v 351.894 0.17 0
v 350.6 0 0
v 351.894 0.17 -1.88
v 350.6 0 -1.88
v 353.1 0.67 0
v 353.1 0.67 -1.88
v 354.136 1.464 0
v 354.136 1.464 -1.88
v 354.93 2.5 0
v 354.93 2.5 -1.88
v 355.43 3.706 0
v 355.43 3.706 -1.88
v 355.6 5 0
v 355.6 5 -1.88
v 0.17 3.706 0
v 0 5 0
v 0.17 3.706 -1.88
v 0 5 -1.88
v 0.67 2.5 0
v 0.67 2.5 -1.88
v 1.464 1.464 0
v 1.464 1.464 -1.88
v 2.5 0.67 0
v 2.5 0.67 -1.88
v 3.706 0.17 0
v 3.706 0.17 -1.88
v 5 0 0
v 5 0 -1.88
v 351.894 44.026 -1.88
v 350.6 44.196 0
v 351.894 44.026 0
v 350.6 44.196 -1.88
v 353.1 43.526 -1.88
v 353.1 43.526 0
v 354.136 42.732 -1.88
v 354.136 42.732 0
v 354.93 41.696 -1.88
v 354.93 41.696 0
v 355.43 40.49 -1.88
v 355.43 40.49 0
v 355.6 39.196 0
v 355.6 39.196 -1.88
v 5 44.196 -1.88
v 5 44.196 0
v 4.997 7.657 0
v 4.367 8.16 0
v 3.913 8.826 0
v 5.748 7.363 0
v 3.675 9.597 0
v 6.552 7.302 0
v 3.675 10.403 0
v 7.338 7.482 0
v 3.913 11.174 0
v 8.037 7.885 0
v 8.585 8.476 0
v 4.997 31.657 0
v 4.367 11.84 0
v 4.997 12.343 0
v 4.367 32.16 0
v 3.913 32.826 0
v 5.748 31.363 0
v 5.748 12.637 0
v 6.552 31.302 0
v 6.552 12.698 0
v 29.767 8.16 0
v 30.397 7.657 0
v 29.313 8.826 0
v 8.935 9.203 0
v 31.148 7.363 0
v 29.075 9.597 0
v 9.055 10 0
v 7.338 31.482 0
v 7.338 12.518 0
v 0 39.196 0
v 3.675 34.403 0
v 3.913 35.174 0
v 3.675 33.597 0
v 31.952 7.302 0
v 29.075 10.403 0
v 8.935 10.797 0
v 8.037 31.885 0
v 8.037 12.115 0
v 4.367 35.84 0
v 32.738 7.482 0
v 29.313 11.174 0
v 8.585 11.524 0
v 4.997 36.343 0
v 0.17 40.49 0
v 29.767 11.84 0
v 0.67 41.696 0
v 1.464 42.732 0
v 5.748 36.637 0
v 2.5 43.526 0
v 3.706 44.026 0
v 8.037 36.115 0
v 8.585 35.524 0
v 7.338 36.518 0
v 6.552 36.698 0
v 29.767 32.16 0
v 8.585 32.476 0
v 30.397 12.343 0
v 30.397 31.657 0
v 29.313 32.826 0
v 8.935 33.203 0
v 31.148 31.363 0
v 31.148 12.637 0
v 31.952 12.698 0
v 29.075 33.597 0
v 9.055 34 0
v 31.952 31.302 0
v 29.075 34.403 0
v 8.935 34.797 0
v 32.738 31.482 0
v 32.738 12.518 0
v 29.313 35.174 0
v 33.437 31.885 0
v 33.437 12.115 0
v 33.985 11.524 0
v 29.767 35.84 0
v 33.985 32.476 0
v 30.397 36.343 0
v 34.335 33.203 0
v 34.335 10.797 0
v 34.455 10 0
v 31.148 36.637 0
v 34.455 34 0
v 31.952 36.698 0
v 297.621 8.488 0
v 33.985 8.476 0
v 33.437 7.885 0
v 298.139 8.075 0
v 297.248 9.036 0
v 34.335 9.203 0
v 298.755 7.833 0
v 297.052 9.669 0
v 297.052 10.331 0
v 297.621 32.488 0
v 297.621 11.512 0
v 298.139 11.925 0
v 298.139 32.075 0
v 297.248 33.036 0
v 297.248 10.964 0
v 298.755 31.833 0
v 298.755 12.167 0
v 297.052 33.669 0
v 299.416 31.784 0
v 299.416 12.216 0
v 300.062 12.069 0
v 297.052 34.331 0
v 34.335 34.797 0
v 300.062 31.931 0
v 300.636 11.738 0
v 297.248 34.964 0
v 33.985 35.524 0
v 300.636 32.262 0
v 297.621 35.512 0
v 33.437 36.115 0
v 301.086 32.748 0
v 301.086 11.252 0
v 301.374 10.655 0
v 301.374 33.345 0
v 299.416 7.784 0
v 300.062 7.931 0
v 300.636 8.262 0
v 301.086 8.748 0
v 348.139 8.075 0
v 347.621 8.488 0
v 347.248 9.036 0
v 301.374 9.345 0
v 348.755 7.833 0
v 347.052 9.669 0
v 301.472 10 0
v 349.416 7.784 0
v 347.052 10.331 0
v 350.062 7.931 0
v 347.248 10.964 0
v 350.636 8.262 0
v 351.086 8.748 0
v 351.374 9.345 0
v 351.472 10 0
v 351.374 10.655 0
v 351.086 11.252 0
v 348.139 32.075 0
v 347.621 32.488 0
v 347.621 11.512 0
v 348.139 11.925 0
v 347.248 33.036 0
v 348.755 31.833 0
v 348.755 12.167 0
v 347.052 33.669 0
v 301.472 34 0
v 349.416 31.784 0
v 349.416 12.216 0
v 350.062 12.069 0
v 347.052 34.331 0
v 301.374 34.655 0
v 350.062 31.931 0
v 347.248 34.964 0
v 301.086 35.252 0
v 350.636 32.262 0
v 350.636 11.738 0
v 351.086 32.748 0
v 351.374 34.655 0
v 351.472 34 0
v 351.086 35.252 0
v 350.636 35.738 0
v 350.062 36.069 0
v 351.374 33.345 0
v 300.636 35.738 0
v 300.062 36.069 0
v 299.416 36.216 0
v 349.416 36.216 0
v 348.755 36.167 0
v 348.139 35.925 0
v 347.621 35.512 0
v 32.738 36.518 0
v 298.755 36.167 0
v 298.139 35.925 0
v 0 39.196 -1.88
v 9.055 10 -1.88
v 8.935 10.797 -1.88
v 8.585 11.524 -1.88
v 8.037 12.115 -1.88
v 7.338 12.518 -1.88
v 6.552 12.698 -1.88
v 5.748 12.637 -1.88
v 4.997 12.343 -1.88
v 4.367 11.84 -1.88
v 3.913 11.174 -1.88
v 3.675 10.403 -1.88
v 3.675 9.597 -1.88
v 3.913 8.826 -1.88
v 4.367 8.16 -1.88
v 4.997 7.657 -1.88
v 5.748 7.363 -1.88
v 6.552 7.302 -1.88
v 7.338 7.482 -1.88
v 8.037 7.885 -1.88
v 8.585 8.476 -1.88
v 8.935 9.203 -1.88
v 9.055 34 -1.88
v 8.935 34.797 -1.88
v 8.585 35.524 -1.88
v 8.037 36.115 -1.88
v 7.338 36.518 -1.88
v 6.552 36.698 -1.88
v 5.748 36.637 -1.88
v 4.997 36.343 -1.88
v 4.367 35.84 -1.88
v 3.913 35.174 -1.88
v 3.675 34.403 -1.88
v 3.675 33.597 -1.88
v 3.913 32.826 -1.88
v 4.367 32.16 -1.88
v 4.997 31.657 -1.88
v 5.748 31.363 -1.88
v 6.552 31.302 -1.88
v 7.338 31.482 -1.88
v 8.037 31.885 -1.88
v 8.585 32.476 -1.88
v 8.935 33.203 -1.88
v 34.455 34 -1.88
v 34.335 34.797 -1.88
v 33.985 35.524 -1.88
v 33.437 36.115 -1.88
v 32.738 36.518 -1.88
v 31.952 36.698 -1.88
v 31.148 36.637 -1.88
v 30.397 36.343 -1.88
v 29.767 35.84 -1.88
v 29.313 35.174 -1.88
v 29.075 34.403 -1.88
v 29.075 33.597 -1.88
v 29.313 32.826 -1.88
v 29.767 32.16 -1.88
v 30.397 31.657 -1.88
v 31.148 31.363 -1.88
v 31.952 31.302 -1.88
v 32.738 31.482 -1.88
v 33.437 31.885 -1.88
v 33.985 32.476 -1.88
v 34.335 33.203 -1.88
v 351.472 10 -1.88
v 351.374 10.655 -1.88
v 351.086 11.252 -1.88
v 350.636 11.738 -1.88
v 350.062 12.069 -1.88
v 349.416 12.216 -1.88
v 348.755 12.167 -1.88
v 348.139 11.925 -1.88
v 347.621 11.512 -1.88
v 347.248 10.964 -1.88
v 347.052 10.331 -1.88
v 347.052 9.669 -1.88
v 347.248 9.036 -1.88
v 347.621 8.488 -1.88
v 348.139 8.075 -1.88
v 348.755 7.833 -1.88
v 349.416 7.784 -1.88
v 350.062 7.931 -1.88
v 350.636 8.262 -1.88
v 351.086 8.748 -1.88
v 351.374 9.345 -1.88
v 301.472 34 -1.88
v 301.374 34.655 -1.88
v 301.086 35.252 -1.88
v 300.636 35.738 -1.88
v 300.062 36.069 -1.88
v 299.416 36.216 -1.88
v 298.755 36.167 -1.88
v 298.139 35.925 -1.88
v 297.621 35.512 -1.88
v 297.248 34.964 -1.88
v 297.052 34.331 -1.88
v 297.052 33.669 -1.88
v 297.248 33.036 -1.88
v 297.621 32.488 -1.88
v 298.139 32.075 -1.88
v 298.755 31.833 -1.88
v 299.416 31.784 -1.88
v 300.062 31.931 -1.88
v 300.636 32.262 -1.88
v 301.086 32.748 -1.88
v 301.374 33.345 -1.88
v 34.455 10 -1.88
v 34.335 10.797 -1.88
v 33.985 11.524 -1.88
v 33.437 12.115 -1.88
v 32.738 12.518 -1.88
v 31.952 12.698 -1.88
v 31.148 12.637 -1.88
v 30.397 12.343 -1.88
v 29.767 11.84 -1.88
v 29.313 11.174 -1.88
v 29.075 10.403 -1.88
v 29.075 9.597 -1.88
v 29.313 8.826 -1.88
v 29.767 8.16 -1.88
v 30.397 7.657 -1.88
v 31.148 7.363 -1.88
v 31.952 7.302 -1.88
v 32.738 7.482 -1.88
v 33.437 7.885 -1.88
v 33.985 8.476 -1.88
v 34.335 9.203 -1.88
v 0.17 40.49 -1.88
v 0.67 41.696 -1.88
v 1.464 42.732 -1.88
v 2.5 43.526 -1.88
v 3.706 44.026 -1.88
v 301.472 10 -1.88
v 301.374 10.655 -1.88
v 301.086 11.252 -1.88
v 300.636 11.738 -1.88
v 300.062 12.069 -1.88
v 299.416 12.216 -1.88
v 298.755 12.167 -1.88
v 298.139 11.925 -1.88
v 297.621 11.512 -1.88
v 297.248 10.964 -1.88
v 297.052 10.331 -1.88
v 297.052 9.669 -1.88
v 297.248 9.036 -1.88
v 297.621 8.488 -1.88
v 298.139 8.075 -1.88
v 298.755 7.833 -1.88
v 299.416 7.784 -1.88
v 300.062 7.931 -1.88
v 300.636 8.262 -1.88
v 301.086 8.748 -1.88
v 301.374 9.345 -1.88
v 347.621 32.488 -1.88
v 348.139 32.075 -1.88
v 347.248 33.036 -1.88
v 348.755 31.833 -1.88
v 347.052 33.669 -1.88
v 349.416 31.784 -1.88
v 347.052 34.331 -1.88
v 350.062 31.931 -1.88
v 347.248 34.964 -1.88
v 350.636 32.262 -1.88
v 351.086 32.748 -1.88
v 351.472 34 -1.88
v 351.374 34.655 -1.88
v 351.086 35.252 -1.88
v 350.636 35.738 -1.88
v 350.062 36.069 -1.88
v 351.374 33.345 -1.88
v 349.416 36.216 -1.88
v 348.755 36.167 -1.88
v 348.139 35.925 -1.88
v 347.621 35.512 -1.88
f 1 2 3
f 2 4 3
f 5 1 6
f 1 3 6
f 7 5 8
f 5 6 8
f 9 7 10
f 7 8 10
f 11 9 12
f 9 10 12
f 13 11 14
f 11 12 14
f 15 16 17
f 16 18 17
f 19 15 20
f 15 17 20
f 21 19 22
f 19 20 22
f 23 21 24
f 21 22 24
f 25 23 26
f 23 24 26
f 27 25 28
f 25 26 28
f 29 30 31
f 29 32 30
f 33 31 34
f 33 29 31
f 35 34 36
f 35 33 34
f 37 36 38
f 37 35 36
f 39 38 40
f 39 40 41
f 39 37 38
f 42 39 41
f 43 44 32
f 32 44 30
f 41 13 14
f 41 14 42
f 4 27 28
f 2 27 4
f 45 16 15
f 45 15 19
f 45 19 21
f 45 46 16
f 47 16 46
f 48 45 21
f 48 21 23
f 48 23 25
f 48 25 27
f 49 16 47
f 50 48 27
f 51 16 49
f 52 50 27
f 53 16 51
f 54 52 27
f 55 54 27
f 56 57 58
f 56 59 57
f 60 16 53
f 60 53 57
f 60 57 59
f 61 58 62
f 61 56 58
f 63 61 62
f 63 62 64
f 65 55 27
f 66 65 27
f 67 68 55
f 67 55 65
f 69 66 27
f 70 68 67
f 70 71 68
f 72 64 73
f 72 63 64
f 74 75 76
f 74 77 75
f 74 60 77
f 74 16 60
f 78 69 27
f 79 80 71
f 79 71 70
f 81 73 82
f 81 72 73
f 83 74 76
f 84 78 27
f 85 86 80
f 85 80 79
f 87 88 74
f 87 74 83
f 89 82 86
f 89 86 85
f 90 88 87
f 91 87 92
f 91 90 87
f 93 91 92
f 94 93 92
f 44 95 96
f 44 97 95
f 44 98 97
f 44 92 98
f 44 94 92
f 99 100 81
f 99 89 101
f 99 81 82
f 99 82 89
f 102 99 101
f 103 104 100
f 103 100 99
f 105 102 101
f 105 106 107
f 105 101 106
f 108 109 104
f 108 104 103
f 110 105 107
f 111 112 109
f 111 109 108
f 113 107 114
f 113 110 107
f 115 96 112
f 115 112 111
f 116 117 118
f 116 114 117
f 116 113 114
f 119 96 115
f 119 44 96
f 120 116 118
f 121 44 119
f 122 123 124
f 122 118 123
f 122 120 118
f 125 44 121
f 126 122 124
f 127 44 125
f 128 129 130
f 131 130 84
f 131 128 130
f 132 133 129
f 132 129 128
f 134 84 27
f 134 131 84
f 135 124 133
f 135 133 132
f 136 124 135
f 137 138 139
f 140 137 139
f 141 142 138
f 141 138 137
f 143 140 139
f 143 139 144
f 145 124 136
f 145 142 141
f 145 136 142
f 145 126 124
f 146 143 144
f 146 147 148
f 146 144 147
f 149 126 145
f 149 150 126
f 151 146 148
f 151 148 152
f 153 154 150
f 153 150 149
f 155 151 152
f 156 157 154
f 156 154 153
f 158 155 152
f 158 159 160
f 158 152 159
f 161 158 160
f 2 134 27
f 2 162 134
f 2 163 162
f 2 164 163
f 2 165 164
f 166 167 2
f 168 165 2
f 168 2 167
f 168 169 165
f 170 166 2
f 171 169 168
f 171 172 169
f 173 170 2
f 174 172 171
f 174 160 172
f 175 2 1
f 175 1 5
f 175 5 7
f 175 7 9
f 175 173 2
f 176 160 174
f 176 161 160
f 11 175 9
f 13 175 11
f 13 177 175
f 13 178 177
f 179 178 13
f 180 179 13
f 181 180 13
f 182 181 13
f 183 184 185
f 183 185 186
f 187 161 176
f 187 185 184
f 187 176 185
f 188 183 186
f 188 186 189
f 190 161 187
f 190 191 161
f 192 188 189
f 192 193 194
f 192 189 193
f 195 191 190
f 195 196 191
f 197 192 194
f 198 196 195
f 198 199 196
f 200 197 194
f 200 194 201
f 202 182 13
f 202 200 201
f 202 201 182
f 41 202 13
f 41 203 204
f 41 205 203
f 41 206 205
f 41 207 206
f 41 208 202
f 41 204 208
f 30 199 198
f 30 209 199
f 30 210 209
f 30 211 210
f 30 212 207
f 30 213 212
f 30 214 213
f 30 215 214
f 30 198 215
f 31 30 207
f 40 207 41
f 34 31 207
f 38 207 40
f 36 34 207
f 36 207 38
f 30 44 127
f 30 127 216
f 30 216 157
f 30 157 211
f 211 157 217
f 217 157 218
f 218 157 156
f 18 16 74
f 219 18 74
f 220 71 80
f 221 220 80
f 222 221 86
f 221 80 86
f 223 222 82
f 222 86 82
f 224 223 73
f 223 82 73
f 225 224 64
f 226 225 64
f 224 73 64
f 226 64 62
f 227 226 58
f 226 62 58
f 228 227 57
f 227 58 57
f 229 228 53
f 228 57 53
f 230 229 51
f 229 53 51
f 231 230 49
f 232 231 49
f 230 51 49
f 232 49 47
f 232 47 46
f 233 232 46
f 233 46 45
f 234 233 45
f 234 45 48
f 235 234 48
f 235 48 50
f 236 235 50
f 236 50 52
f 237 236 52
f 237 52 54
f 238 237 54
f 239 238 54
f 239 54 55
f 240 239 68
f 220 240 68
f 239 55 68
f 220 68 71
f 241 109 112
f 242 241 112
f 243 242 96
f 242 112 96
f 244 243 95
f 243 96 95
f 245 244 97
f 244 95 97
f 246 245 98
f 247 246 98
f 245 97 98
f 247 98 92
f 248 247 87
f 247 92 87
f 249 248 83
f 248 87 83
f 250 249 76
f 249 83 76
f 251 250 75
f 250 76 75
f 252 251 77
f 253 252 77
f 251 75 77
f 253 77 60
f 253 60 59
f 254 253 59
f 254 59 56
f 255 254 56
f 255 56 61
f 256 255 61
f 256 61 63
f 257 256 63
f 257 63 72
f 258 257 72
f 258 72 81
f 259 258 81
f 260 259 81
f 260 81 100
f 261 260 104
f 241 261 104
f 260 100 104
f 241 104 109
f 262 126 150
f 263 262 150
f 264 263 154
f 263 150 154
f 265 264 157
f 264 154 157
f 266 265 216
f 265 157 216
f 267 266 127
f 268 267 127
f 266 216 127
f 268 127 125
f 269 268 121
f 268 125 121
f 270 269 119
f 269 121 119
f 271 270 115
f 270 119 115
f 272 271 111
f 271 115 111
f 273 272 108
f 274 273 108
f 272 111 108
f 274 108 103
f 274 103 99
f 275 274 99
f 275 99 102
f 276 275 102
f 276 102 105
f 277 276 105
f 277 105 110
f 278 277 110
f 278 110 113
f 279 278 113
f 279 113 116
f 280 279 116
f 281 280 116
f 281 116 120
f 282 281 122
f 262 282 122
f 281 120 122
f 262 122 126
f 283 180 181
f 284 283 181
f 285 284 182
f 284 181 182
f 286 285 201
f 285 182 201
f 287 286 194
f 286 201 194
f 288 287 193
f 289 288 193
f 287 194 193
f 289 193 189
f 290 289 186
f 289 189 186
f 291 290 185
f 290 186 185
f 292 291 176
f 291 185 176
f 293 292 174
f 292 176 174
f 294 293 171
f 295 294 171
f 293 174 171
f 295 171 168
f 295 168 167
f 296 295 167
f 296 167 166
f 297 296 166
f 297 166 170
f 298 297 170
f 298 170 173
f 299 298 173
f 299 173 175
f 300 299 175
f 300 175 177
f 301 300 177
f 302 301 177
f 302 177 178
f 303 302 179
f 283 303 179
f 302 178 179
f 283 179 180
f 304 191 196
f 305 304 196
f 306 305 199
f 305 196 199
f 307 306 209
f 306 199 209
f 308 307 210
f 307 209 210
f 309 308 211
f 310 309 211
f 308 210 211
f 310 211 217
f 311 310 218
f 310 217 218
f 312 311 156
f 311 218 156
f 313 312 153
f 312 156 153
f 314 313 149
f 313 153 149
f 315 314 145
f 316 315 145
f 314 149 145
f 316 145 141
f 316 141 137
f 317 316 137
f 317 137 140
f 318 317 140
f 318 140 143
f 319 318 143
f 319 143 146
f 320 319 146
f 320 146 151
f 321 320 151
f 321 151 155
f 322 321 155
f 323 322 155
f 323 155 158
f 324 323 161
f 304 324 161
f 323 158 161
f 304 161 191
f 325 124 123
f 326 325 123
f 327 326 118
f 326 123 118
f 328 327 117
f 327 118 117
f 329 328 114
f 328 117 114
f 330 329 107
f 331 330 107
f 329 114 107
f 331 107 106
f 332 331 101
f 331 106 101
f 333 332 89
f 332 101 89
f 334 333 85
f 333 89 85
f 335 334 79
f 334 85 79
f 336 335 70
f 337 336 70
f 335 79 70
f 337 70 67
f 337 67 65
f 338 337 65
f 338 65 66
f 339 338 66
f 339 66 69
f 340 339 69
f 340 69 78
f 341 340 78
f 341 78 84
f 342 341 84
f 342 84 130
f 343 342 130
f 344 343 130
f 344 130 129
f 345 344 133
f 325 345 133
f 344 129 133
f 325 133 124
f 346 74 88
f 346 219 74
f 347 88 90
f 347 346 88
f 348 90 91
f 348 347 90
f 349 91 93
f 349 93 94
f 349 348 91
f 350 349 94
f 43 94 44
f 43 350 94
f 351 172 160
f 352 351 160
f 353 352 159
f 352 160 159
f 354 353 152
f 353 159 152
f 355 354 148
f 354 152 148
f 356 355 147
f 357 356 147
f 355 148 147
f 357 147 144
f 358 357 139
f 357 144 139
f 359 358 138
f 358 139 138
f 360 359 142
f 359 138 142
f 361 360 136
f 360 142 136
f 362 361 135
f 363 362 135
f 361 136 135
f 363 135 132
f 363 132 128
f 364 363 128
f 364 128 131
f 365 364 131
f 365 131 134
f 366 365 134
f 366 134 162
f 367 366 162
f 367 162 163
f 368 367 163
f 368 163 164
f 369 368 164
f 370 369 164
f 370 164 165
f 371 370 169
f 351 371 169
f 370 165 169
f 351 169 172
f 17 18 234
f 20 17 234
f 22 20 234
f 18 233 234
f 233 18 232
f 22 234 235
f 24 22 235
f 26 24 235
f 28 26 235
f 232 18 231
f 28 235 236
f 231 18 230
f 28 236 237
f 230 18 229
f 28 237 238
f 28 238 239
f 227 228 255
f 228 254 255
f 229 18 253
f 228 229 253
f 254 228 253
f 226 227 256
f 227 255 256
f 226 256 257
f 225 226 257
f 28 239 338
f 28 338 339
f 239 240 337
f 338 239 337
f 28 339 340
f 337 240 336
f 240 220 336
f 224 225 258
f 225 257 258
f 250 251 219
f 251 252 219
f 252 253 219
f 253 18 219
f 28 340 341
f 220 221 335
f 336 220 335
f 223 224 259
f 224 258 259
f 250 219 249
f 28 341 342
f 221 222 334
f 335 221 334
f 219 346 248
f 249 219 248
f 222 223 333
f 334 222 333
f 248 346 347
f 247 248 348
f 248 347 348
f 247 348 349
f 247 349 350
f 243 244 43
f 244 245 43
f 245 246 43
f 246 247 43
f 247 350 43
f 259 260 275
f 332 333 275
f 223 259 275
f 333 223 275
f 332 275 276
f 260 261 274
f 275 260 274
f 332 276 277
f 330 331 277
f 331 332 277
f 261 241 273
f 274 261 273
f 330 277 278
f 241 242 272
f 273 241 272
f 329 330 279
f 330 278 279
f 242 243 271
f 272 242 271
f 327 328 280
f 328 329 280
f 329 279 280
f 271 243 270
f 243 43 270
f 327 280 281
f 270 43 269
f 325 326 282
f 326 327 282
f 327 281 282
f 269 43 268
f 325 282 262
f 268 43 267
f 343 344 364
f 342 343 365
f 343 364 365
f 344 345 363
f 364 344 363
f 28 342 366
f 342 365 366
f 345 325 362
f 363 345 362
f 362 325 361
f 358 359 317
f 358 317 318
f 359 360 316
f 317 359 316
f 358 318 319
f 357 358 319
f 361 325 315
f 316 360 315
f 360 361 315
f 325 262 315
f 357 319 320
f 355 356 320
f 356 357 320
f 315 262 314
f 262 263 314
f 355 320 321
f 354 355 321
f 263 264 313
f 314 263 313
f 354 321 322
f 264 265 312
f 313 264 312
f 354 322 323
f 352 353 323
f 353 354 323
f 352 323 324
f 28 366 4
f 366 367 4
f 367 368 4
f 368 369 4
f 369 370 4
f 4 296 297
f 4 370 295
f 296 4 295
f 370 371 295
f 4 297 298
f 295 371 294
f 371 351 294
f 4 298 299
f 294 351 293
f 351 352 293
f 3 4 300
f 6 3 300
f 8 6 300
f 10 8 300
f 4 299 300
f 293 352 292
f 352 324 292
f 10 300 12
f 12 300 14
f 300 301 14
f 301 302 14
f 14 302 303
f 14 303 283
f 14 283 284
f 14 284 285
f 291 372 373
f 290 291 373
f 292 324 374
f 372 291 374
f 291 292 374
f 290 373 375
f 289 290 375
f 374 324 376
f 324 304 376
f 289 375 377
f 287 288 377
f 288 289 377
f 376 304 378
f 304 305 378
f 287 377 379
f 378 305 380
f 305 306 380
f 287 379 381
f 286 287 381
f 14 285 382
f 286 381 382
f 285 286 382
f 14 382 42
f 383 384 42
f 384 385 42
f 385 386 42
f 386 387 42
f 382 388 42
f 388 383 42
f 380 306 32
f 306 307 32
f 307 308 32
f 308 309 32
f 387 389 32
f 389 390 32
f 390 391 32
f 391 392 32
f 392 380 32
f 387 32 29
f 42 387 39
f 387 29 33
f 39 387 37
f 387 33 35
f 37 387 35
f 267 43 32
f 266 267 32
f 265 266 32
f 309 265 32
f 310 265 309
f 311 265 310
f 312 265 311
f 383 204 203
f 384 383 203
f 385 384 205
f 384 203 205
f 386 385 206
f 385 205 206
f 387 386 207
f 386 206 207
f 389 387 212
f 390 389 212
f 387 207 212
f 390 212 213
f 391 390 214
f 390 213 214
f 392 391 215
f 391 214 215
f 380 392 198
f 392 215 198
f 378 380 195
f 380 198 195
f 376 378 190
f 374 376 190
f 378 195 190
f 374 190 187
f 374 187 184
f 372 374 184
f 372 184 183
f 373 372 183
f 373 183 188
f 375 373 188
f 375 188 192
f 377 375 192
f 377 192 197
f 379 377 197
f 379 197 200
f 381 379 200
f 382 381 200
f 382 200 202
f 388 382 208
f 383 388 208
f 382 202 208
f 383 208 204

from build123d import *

# Parameters (mm, degrees)
SKETCH1_W          = 355.6
SKETCH1_H          = 44.196
SKETCH1_R          = 2.2225
SKETCH1_R_2        = 2.7051
BASE_FLANGE1_DEPTH = 1.8796
FILLET1_R          = 5


# Sheet-metal steps are written as plain solids
with BuildPart() as part:
    # Sketch1 → Base-Flange1 (new body)
    with BuildSketch(Plane.XY):
        with Locations((177.8, 22.098)):
            Rectangle(SKETCH1_W, SKETCH1_H)
        with Locations((299.25, 10)):
            Circle(SKETCH1_R, mode=Mode.SUBTRACT)
        with Locations((349.25, 10)):
            Circle(SKETCH1_R, mode=Mode.SUBTRACT)
        with Locations((349.25, 34)):
            Circle(SKETCH1_R, mode=Mode.SUBTRACT)
        with Locations((299.25, 34)):
            Circle(SKETCH1_R, mode=Mode.SUBTRACT)
        with Locations((6.35, 34)):
            Circle(SKETCH1_R_2, mode=Mode.SUBTRACT)
        with Locations((31.75, 34)):
            Circle(SKETCH1_R_2, mode=Mode.SUBTRACT)
        with Locations((6.35, 10)):
            Circle(SKETCH1_R_2, mode=Mode.SUBTRACT)
        with Locations((31.75, 10)):
            Circle(SKETCH1_R_2, mode=Mode.SUBTRACT)
    extrude(amount=-BASE_FLANGE1_DEPTH)

    # Fillet1
    fillet1_edges = [part.edges().sort_by_distance(p)[0] for p in [
        (0, 44.196, -0.9398),
        (355.6, 44.196, -0.9398),
        (355.6, 0, -0.9398),
        (0, 0, -0.9398),
    ]]
    fillet(fillet1_edges, radius=FILLET1_R)


solid = part.part
